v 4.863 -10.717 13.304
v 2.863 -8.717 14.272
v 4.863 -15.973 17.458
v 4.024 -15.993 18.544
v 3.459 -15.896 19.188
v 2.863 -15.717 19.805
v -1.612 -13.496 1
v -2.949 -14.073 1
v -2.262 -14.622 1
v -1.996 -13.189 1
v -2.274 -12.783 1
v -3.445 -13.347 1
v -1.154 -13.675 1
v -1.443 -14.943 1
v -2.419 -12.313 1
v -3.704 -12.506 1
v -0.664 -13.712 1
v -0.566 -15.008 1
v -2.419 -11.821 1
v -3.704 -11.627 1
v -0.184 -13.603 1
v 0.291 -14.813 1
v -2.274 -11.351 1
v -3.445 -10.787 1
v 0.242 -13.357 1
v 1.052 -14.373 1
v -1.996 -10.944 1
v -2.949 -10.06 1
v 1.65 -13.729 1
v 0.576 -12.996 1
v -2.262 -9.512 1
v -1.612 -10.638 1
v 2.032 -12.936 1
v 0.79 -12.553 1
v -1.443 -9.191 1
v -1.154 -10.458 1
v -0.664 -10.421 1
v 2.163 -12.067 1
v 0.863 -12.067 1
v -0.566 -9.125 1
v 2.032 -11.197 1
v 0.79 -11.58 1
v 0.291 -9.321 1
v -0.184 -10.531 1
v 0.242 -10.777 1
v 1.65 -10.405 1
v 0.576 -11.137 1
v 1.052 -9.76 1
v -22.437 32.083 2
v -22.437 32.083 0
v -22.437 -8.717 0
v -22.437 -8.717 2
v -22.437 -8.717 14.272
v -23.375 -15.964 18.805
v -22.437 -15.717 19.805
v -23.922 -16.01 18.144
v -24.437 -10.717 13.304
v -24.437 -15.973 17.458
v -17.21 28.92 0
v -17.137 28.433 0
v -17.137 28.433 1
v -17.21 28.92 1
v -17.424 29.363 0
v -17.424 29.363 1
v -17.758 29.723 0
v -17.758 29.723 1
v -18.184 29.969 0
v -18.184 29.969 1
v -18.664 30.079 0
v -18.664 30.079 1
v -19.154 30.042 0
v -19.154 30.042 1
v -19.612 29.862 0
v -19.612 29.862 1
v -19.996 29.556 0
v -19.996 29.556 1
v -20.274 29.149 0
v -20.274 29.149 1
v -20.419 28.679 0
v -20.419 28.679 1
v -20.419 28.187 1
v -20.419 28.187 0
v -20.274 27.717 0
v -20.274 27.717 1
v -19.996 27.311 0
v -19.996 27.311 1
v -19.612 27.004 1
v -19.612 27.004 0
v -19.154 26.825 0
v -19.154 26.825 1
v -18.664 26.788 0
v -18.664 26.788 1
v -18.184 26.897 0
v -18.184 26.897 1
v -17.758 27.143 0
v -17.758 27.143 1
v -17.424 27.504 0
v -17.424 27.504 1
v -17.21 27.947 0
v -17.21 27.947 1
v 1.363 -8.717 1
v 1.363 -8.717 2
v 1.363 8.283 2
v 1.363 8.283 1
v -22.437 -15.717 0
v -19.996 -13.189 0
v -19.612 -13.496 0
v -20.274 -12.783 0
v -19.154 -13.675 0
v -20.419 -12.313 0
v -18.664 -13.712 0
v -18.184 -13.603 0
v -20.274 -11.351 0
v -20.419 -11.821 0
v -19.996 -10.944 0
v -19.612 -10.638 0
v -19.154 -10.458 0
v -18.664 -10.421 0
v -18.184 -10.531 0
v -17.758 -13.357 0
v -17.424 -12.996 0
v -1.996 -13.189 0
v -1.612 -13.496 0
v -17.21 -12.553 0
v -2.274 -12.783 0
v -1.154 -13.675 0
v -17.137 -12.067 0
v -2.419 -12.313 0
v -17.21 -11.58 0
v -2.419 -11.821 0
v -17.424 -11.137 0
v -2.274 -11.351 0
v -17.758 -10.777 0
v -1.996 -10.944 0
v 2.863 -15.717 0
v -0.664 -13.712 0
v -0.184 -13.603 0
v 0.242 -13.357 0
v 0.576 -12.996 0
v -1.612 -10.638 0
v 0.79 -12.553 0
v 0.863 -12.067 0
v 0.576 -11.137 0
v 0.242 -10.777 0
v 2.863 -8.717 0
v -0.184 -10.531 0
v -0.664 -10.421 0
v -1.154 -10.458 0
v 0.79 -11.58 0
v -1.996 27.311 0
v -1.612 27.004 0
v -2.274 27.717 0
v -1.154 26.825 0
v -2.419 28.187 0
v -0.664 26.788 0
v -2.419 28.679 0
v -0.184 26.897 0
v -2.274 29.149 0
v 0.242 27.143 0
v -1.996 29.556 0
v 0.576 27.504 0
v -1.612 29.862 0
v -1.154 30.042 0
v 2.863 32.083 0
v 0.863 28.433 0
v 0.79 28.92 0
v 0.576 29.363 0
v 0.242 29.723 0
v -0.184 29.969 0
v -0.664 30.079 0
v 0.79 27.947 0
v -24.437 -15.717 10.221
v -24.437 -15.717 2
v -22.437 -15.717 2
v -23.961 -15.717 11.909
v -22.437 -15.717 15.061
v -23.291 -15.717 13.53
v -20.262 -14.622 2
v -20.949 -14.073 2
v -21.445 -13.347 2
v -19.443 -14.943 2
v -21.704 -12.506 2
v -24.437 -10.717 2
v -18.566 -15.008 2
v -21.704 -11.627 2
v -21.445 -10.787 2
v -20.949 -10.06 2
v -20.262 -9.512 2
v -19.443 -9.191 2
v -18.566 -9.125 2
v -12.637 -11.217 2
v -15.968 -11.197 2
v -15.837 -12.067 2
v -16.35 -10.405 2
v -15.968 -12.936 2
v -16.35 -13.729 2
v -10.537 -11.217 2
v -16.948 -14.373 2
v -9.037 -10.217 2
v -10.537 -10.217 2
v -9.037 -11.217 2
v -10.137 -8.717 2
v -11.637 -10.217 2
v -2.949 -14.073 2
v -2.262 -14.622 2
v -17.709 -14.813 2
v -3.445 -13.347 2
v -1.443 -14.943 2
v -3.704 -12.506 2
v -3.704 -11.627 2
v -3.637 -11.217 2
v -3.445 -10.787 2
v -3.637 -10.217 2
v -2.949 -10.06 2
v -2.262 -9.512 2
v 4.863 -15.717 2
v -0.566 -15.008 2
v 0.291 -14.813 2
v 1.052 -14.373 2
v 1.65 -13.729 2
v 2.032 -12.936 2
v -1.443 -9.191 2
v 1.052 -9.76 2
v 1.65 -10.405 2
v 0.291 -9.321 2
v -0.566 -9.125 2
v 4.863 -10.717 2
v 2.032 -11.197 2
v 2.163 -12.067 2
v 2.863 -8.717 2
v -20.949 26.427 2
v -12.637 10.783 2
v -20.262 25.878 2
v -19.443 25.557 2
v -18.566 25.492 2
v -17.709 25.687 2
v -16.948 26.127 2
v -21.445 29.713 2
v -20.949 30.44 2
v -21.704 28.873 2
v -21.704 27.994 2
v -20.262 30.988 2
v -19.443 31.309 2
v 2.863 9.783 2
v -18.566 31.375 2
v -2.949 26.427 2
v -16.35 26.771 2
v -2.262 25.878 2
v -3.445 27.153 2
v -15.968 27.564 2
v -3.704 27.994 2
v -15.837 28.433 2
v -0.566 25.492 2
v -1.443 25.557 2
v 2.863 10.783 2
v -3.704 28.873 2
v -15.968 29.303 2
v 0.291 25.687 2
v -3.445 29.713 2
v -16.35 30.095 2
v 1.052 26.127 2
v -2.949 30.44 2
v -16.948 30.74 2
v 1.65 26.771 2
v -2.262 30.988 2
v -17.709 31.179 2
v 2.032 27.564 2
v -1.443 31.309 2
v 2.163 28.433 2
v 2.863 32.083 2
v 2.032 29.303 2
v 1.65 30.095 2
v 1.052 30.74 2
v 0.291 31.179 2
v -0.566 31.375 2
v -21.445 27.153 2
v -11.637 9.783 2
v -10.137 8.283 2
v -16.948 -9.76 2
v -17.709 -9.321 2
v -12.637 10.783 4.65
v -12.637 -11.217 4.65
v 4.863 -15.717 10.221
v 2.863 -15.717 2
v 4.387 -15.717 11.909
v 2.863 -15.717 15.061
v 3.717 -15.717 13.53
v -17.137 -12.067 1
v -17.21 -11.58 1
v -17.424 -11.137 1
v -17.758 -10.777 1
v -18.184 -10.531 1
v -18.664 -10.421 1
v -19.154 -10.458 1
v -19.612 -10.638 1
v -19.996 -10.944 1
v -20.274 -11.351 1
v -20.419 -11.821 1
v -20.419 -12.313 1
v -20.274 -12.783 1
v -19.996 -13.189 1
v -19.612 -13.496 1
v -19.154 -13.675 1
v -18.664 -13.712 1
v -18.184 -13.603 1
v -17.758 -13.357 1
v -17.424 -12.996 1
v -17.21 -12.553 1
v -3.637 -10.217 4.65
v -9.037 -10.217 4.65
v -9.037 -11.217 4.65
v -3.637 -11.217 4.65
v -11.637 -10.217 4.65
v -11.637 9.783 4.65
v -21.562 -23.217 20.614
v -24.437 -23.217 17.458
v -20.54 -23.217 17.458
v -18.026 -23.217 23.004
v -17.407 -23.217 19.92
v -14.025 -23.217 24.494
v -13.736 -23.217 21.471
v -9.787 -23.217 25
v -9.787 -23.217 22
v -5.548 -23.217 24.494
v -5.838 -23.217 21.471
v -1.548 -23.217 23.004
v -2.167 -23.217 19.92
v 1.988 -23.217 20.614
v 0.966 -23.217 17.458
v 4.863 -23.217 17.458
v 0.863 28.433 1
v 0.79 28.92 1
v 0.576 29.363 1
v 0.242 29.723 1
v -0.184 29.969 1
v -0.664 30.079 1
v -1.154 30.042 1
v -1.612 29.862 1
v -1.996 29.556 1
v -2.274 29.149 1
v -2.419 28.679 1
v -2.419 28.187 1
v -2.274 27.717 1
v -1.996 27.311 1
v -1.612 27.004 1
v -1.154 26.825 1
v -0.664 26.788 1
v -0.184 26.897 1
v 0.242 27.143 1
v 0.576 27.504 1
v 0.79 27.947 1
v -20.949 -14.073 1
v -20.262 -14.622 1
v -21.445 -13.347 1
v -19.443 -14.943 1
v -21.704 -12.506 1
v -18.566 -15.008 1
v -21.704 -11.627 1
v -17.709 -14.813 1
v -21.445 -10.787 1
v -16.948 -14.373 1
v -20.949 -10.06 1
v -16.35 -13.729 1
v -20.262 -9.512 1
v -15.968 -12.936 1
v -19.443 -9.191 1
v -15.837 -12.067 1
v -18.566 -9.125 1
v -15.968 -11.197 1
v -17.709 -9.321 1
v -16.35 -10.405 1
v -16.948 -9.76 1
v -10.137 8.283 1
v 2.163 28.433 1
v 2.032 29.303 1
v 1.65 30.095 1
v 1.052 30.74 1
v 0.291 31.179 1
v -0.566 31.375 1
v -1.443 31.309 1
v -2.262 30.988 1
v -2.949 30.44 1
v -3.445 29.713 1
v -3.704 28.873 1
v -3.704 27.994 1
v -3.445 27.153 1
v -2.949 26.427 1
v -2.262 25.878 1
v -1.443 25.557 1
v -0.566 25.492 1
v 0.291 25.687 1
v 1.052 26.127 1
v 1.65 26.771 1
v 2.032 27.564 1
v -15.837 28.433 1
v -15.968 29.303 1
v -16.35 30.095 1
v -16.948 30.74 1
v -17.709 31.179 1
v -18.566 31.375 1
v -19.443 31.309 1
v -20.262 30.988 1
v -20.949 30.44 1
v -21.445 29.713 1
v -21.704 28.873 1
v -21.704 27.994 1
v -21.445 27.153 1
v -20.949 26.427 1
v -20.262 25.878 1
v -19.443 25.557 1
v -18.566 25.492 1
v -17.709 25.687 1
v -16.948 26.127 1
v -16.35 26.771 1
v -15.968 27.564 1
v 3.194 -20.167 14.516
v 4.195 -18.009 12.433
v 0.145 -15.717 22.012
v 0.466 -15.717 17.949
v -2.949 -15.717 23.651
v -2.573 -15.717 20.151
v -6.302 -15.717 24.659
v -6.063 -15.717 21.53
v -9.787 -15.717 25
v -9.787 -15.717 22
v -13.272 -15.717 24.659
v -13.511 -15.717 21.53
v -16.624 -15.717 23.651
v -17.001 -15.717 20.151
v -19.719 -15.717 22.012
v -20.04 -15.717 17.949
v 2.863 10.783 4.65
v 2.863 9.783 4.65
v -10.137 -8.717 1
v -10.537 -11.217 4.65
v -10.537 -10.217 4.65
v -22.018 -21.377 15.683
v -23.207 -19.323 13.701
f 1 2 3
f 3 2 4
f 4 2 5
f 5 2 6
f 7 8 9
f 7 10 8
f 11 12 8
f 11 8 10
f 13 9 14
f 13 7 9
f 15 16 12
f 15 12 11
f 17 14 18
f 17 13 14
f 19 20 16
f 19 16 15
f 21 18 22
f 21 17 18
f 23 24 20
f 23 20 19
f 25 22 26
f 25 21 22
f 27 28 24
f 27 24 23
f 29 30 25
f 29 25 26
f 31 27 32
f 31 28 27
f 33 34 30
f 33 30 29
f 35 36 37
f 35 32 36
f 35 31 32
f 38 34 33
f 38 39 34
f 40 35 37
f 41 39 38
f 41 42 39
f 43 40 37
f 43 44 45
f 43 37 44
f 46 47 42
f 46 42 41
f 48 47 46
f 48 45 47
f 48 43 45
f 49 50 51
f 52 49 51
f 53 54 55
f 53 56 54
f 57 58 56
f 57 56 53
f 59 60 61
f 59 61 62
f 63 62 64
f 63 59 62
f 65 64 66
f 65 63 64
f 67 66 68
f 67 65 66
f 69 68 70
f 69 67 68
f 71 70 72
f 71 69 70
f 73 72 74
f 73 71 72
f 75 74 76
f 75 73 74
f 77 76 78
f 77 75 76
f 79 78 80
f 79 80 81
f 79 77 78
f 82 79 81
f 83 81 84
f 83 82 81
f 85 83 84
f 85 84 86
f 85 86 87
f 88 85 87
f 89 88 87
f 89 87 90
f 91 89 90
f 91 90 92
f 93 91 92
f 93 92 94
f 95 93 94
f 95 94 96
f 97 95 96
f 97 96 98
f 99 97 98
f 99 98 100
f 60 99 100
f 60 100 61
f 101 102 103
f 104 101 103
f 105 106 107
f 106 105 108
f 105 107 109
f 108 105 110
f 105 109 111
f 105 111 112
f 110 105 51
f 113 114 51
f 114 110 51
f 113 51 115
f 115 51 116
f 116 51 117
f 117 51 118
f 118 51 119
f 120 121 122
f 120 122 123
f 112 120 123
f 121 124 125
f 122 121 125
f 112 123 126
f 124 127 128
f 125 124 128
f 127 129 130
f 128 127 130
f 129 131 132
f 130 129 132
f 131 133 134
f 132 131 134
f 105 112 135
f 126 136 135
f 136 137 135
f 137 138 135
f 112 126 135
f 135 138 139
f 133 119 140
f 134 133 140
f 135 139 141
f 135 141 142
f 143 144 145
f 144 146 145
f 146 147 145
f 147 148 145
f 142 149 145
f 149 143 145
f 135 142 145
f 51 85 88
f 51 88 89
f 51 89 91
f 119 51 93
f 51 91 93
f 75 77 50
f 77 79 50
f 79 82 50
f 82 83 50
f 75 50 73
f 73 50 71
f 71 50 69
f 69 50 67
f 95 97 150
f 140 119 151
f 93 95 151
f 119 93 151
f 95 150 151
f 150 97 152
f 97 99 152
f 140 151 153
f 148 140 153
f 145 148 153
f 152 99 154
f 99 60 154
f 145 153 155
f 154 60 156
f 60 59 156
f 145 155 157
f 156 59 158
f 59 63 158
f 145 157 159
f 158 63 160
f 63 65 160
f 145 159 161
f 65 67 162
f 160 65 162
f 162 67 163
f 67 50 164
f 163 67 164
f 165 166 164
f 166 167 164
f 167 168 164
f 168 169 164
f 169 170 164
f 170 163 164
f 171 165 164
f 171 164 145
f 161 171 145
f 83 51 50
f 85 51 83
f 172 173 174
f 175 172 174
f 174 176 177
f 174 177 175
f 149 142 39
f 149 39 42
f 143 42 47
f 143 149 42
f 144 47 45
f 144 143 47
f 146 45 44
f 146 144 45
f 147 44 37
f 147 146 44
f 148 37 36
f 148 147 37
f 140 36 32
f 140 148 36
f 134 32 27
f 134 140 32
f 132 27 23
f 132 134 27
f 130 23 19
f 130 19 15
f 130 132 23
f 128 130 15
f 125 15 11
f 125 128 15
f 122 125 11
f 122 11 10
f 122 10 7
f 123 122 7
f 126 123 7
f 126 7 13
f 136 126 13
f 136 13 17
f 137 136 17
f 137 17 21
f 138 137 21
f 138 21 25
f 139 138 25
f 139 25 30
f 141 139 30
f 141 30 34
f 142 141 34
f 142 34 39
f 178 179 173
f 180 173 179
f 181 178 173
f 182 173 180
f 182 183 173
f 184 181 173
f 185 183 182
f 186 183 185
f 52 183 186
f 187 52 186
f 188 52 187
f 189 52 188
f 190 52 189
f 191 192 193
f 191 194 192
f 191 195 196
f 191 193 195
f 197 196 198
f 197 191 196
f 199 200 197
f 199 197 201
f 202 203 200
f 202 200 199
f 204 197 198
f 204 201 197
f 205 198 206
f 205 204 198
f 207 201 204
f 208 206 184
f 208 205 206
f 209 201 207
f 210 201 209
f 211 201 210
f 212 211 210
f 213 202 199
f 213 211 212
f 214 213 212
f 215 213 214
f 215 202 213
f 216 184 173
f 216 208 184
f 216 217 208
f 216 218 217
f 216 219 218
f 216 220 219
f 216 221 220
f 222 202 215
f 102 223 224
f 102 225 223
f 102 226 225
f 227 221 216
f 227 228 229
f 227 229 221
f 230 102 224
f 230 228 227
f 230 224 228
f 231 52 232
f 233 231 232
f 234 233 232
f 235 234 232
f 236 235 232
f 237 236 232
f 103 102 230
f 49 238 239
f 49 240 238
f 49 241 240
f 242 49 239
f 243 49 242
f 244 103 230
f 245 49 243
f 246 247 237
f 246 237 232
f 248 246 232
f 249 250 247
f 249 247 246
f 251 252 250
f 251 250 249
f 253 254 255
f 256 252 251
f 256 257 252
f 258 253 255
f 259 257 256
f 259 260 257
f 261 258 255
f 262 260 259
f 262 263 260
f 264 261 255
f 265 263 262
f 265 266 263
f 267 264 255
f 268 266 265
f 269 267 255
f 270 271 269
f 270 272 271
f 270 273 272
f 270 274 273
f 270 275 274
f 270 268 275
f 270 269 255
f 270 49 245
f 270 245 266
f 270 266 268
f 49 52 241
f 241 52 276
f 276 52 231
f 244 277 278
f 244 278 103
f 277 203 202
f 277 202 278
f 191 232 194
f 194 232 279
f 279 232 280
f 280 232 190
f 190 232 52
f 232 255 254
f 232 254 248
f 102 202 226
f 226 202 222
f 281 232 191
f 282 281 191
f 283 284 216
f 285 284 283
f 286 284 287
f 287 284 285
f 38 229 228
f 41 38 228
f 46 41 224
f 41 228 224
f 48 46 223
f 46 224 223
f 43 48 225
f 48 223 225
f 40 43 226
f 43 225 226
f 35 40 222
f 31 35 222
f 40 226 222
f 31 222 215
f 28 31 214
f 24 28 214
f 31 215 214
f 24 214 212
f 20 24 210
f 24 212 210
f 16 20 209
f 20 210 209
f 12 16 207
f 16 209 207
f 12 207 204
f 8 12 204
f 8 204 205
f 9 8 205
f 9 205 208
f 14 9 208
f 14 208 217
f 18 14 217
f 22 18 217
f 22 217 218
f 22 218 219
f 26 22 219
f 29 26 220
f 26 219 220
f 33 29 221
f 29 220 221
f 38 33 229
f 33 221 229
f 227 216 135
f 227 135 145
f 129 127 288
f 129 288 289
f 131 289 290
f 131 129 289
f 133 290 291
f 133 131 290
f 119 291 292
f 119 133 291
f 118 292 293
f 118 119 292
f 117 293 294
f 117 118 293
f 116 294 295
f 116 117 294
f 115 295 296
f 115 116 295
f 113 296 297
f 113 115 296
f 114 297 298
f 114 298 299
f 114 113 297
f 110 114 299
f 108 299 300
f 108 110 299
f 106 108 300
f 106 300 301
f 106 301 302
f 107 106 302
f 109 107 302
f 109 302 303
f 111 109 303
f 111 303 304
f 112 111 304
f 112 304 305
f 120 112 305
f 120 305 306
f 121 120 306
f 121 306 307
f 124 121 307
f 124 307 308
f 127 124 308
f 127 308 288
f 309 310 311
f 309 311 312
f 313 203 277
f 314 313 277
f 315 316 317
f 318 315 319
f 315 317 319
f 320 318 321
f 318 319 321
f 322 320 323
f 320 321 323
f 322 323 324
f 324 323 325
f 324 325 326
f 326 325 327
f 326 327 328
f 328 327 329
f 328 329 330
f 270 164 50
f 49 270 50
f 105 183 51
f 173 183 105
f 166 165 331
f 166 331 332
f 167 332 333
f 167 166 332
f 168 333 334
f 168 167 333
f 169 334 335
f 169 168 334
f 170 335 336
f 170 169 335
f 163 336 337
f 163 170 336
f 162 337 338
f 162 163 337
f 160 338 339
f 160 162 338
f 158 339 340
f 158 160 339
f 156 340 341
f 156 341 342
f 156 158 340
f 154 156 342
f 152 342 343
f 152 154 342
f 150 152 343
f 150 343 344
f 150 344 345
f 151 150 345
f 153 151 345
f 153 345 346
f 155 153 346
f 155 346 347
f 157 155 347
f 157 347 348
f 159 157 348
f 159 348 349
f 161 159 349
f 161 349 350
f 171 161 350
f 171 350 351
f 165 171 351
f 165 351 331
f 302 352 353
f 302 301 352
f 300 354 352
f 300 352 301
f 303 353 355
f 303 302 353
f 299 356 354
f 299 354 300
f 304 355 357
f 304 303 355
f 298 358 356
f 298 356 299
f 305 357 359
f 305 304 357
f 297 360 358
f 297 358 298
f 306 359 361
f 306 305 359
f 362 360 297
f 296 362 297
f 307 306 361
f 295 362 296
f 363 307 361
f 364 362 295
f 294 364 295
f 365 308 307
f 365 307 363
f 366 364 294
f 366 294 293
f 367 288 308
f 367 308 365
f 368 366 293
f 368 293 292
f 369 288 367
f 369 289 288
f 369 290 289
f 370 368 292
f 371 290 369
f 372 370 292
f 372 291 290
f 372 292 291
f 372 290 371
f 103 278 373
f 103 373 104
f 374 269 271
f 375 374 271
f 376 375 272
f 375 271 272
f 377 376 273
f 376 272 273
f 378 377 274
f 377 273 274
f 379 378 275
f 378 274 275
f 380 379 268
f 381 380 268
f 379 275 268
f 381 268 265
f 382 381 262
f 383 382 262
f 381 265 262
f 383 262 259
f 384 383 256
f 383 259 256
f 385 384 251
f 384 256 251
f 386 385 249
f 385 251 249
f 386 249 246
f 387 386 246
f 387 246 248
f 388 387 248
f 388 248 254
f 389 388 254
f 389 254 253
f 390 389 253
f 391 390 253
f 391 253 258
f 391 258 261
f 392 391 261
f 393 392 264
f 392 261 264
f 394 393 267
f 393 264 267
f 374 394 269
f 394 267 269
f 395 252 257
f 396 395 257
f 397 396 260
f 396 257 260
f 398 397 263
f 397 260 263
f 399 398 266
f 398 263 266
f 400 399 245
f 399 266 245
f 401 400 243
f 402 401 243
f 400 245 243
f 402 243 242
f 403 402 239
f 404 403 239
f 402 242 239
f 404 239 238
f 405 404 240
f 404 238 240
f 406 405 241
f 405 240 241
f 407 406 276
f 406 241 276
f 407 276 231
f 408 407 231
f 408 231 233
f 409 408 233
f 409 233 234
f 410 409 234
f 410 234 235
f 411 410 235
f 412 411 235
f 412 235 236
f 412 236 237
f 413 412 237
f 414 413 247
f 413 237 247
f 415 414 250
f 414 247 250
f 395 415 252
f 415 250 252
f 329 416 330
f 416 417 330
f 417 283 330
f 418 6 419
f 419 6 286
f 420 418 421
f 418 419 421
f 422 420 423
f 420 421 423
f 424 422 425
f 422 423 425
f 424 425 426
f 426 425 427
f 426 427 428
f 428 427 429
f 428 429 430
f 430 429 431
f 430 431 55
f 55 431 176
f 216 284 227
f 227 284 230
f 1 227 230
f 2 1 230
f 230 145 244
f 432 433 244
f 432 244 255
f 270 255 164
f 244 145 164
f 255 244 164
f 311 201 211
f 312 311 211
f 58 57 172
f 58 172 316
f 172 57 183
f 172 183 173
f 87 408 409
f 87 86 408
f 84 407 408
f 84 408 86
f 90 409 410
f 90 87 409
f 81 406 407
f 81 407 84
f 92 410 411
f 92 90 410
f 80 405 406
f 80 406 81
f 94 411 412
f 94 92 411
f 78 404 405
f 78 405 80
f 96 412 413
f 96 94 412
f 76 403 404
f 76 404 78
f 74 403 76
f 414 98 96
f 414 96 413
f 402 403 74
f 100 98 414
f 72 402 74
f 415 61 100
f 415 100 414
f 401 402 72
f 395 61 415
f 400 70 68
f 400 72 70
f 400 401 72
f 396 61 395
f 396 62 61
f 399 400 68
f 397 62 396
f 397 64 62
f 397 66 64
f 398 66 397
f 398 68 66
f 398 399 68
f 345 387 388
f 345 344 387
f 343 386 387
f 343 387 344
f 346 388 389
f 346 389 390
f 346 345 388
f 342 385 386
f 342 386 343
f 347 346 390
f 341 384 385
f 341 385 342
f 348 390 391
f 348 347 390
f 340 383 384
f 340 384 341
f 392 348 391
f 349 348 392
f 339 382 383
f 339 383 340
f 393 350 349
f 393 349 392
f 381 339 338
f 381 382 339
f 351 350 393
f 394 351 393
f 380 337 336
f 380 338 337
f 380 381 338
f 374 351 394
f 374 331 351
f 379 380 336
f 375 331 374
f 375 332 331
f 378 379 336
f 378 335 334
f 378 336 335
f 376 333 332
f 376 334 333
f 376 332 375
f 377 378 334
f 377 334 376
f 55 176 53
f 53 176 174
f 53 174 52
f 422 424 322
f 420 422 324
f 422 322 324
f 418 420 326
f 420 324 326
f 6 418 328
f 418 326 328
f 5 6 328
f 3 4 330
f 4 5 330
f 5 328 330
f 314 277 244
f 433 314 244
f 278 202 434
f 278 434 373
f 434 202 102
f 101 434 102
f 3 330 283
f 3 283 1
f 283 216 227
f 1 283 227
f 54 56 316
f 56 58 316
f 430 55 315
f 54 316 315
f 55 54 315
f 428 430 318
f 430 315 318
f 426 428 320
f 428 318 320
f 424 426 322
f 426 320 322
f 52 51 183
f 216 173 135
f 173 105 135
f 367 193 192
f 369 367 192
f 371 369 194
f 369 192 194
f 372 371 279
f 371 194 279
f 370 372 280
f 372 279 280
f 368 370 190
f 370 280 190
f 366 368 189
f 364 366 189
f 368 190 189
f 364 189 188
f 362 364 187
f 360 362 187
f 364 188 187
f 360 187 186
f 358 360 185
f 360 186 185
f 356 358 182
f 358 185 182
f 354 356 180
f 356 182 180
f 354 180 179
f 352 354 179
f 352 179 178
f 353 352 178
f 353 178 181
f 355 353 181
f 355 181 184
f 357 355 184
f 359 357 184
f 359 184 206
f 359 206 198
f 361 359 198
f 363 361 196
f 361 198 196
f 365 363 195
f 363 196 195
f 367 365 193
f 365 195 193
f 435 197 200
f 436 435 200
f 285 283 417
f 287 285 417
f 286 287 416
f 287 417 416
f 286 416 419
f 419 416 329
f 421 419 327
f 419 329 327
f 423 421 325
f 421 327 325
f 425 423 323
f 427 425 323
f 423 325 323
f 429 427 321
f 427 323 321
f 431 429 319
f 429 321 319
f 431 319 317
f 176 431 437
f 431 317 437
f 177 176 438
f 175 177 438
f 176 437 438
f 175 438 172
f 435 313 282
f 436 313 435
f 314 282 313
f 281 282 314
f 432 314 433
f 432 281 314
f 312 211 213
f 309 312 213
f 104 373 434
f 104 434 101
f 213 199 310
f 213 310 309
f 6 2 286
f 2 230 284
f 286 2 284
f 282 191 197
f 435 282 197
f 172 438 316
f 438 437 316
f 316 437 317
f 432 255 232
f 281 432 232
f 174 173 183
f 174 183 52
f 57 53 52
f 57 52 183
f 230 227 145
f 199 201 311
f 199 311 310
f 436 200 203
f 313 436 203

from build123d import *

# Parameters (mm, degrees)
F0_R      = 1.65
F1_DEPTH  = 2
F2_R      = 2.95
F2_R_2    = 1.65
F2_W      = 11.5
F2_H      = 17
F3_DEPTH  = 1
F4_W      = 5.4
F4_H      = 1
F5_DEPTH  = 2.65
F7_DEPTH  = 23
F9_DEPTH  = 7.5
F10_DEPTH = 55.301
F12_DEPTH = 29.301
F13_SIZE  = 1.99999
F15_DEPTH = 2.001
F17_DEPTH = 2.001
F18_SIZE  = 1.99999


# Not quite as in the source:
# - a fillet or chamfer is up to 0.001 mm smaller than in the source, because OpenCascade refuses the exact size


with BuildPart() as f1:
    # F0 (on Top) → F1 (new body)
    with BuildSketch(Plane.XY):
        Polygon((2.8630541071, 32.0832646102), (-22.4369458929, 32.0832646102), (-22.4369458929, -8.7167353898), (-24.4369458929, -10.7167353898), (-24.4369458929, -15.7167353898), (-21.1369458929, -15.7167353898), (2.8630541071, -15.7167353898), (4.8630541071, -15.7167353898), (4.8630541071, -10.7167353898), (2.8630541071, -8.7167353898), align=None)
        with Locations((-18.7869458929, -12.0667353898)):
            Circle(F0_R, mode=Mode.SUBTRACT)
        with Locations((-0.7869458929, -12.0667353898)):
            Circle(F0_R, mode=Mode.SUBTRACT)
        with Locations((-18.7869458929, 28.4332646102)):
            Circle(F0_R, mode=Mode.SUBTRACT)
        with Locations((-0.7869458929, 28.4332646102)):
            Circle(F0_R, mode=Mode.SUBTRACT)
    extrude(amount=F1_DEPTH)

    # F2 (on face) → F3 (cut)
    with BuildSketch(Plane.XY.offset(2)):
        with Locations((-18.7869458929, -12.0667353898)):
            Circle(F2_R)
        with Locations((-18.7869458929, -12.0667353898)):
            Circle(F2_R_2, mode=Mode.SUBTRACT)
        with Locations((-0.7869458929, -12.0667353898)):
            Circle(F2_R)
        with Locations((-0.7869458929, -12.0667353898)):
            Circle(F2_R_2, mode=Mode.SUBTRACT)
        with Locations((-18.7869458929, 28.4332646102)):
            Circle(F2_R)
        with Locations((-18.7869458929, 28.4332646102)):
            Circle(F2_R_2, mode=Mode.SUBTRACT)
        with Locations((-0.7869458929, 28.4332646102)):
            Circle(F2_R)
        with Locations((-0.7869458929, 28.4332646102)):
            Circle(F2_R_2, mode=Mode.SUBTRACT)
        with Locations((-4.3869458929, -0.2167353898)):
            Rectangle(F2_W, F2_H)
    extrude(amount=-F3_DEPTH, mode=Mode.SUBTRACT)

    # F4 (on face) → F5 (join)
    with BuildSketch(Plane.XY.offset(2)):
        Polygon((-10.5369458929, -11.2167353898), (-10.5369458929, -10.2167353898), (-11.6369458929, -10.2167353898), (-11.6369458929, 9.7832646102), (2.8630541071, 9.7832646102), (2.8630541071, 10.7832646102), (-12.6369458929, 10.7832646102), (-12.6369458929, -11.2167353898), align=None)
        with Locations((-6.3369458929, -10.7167353898)):
            Rectangle(F4_W, F4_H)
    extrude(amount=F5_DEPTH)

    # F13 (size 2 in the source; OpenCascade refuses exactly that, so slightly less here)
    f13_edges = [f1.edges().sort_by_distance(p)[0] for p in [
        (4.863054, -13.216735, 0),
        (-24.436946, -13.216735, 0),
    ]]
    chamfer(f13_edges, length=F13_SIZE)


with BuildPart() as f7:
    # F6 (on face) → F7 (new body)
    with BuildSketch(Plane.XY.offset(2)):
        Polygon((4.8630541071, -15.7167353898), (2.8630541071, -15.7167353898), (-22.4369458929, -15.7167353898), (-24.4369458929, -15.7167353898), (-24.4369458929, -23.2167353898), (4.8630541071, -23.2167353898), align=None)
        Polygon((4.8630541071, -10.7167353898), (2.8630541071, -8.7167353898), (2.8630541071, -15.7167353898), (4.8630541071, -15.7167353898), align=None)
        Polygon((-24.4369458929, -15.7167353898), (-22.4369458929, -15.7167353898), (-22.4369458929, -8.7167353898), (-24.4369458929, -10.7167353898), align=None)
    extrude(amount=F7_DEPTH)

    # F8 (on face) → F9 (cut)
    with BuildSketch(Plane.XZ.offset(23.2167353898)):
        with BuildLine():
            Line((4.8630541071, 2), (4.8630541071, 10.2214127336))
            ThreePointArc((4.8630541071, 10.2214127336), (-9.7869458929, 22), (-24.4369458929, 10.2214127336))
            Line((-24.4369458929, 10.2214127336), (-24.4369458929, 2))
            Line((-24.4369458929, 2), (4.8630541071, 2))
        make_face()
    extrude(amount=-F9_DEPTH, mode=Mode.SUBTRACT)

    # F8 (on face) → F10 (cut, through all)
    with BuildSketch(Plane.XZ.offset(23.2167353898)):
        with BuildLine():
            Line((-24.4369458929, 25), (-24.4369458929, 17.4583698539))
            ThreePointArc((-24.4369458929, 17.4583698539), (-18.0255544717, 23.0039160422), (-9.7869458929, 25))
            Line((-9.7869458929, 25), (-24.4369458929, 25))
        make_face()
        with BuildLine():
            ThreePointArc((-9.7869458929, 25), (-1.548337314, 23.0039160422), (4.8630541071, 17.4583698539))
            Line((4.8630541071, 17.4583698539), (4.8630541071, 25))
            Line((4.8630541071, 25), (-9.7869458929, 25))
        make_face()
    extrude(amount=-F10_DEPTH, mode=Mode.SUBTRACT)

    # F11 (on face) → F12 (cut, through all)
    with BuildSketch(Plane.YZ.offset(4.8630541071)):
        Polygon((-23.2167353898, 10.2214127336), (-15.7167353898, 10.2214127336), (-23.2167353898, 17.4583698539), align=None)
    extrude(amount=-F12_DEPTH, mode=Mode.SUBTRACT)

    # F14 (on face) → F15 (cut, through all)
    with BuildSketch(Plane.YZ.offset(-22.4369458929)):
        Polygon((-8.7167353898, 19.8053699673), (-15.7167353898, 19.8053699673), (-8.7167353898, 14.2720625306), align=None)
    extrude(amount=-F15_DEPTH, mode=Mode.SUBTRACT)

    # F16 (on face) → F17 (cut, through all)
    with BuildSketch(Plane(origin=(2.8630541071, 0, 0), x_dir=(0, -1, 0), z_dir=(-1, 0, 0))):
        Polygon((15.7167353898, 19.8053699673), (8.7167353898, 19.8053699673), (8.7167353898, 14.2720625306), align=None)
    extrude(amount=-F17_DEPTH, mode=Mode.SUBTRACT)

    # F18 (size 2 in the source; OpenCascade refuses exactly that, so slightly less here)
    f18_edges = [f7.edges().sort_by_distance(p)[0] for p in [
        (-24.436946, -11.73218, 16.655689),
        (4.863054, -11.73218, 16.655689),
    ]]
    chamfer(f18_edges, length=F18_SIZE)


solid = Compound([f1.part, f7.part])
